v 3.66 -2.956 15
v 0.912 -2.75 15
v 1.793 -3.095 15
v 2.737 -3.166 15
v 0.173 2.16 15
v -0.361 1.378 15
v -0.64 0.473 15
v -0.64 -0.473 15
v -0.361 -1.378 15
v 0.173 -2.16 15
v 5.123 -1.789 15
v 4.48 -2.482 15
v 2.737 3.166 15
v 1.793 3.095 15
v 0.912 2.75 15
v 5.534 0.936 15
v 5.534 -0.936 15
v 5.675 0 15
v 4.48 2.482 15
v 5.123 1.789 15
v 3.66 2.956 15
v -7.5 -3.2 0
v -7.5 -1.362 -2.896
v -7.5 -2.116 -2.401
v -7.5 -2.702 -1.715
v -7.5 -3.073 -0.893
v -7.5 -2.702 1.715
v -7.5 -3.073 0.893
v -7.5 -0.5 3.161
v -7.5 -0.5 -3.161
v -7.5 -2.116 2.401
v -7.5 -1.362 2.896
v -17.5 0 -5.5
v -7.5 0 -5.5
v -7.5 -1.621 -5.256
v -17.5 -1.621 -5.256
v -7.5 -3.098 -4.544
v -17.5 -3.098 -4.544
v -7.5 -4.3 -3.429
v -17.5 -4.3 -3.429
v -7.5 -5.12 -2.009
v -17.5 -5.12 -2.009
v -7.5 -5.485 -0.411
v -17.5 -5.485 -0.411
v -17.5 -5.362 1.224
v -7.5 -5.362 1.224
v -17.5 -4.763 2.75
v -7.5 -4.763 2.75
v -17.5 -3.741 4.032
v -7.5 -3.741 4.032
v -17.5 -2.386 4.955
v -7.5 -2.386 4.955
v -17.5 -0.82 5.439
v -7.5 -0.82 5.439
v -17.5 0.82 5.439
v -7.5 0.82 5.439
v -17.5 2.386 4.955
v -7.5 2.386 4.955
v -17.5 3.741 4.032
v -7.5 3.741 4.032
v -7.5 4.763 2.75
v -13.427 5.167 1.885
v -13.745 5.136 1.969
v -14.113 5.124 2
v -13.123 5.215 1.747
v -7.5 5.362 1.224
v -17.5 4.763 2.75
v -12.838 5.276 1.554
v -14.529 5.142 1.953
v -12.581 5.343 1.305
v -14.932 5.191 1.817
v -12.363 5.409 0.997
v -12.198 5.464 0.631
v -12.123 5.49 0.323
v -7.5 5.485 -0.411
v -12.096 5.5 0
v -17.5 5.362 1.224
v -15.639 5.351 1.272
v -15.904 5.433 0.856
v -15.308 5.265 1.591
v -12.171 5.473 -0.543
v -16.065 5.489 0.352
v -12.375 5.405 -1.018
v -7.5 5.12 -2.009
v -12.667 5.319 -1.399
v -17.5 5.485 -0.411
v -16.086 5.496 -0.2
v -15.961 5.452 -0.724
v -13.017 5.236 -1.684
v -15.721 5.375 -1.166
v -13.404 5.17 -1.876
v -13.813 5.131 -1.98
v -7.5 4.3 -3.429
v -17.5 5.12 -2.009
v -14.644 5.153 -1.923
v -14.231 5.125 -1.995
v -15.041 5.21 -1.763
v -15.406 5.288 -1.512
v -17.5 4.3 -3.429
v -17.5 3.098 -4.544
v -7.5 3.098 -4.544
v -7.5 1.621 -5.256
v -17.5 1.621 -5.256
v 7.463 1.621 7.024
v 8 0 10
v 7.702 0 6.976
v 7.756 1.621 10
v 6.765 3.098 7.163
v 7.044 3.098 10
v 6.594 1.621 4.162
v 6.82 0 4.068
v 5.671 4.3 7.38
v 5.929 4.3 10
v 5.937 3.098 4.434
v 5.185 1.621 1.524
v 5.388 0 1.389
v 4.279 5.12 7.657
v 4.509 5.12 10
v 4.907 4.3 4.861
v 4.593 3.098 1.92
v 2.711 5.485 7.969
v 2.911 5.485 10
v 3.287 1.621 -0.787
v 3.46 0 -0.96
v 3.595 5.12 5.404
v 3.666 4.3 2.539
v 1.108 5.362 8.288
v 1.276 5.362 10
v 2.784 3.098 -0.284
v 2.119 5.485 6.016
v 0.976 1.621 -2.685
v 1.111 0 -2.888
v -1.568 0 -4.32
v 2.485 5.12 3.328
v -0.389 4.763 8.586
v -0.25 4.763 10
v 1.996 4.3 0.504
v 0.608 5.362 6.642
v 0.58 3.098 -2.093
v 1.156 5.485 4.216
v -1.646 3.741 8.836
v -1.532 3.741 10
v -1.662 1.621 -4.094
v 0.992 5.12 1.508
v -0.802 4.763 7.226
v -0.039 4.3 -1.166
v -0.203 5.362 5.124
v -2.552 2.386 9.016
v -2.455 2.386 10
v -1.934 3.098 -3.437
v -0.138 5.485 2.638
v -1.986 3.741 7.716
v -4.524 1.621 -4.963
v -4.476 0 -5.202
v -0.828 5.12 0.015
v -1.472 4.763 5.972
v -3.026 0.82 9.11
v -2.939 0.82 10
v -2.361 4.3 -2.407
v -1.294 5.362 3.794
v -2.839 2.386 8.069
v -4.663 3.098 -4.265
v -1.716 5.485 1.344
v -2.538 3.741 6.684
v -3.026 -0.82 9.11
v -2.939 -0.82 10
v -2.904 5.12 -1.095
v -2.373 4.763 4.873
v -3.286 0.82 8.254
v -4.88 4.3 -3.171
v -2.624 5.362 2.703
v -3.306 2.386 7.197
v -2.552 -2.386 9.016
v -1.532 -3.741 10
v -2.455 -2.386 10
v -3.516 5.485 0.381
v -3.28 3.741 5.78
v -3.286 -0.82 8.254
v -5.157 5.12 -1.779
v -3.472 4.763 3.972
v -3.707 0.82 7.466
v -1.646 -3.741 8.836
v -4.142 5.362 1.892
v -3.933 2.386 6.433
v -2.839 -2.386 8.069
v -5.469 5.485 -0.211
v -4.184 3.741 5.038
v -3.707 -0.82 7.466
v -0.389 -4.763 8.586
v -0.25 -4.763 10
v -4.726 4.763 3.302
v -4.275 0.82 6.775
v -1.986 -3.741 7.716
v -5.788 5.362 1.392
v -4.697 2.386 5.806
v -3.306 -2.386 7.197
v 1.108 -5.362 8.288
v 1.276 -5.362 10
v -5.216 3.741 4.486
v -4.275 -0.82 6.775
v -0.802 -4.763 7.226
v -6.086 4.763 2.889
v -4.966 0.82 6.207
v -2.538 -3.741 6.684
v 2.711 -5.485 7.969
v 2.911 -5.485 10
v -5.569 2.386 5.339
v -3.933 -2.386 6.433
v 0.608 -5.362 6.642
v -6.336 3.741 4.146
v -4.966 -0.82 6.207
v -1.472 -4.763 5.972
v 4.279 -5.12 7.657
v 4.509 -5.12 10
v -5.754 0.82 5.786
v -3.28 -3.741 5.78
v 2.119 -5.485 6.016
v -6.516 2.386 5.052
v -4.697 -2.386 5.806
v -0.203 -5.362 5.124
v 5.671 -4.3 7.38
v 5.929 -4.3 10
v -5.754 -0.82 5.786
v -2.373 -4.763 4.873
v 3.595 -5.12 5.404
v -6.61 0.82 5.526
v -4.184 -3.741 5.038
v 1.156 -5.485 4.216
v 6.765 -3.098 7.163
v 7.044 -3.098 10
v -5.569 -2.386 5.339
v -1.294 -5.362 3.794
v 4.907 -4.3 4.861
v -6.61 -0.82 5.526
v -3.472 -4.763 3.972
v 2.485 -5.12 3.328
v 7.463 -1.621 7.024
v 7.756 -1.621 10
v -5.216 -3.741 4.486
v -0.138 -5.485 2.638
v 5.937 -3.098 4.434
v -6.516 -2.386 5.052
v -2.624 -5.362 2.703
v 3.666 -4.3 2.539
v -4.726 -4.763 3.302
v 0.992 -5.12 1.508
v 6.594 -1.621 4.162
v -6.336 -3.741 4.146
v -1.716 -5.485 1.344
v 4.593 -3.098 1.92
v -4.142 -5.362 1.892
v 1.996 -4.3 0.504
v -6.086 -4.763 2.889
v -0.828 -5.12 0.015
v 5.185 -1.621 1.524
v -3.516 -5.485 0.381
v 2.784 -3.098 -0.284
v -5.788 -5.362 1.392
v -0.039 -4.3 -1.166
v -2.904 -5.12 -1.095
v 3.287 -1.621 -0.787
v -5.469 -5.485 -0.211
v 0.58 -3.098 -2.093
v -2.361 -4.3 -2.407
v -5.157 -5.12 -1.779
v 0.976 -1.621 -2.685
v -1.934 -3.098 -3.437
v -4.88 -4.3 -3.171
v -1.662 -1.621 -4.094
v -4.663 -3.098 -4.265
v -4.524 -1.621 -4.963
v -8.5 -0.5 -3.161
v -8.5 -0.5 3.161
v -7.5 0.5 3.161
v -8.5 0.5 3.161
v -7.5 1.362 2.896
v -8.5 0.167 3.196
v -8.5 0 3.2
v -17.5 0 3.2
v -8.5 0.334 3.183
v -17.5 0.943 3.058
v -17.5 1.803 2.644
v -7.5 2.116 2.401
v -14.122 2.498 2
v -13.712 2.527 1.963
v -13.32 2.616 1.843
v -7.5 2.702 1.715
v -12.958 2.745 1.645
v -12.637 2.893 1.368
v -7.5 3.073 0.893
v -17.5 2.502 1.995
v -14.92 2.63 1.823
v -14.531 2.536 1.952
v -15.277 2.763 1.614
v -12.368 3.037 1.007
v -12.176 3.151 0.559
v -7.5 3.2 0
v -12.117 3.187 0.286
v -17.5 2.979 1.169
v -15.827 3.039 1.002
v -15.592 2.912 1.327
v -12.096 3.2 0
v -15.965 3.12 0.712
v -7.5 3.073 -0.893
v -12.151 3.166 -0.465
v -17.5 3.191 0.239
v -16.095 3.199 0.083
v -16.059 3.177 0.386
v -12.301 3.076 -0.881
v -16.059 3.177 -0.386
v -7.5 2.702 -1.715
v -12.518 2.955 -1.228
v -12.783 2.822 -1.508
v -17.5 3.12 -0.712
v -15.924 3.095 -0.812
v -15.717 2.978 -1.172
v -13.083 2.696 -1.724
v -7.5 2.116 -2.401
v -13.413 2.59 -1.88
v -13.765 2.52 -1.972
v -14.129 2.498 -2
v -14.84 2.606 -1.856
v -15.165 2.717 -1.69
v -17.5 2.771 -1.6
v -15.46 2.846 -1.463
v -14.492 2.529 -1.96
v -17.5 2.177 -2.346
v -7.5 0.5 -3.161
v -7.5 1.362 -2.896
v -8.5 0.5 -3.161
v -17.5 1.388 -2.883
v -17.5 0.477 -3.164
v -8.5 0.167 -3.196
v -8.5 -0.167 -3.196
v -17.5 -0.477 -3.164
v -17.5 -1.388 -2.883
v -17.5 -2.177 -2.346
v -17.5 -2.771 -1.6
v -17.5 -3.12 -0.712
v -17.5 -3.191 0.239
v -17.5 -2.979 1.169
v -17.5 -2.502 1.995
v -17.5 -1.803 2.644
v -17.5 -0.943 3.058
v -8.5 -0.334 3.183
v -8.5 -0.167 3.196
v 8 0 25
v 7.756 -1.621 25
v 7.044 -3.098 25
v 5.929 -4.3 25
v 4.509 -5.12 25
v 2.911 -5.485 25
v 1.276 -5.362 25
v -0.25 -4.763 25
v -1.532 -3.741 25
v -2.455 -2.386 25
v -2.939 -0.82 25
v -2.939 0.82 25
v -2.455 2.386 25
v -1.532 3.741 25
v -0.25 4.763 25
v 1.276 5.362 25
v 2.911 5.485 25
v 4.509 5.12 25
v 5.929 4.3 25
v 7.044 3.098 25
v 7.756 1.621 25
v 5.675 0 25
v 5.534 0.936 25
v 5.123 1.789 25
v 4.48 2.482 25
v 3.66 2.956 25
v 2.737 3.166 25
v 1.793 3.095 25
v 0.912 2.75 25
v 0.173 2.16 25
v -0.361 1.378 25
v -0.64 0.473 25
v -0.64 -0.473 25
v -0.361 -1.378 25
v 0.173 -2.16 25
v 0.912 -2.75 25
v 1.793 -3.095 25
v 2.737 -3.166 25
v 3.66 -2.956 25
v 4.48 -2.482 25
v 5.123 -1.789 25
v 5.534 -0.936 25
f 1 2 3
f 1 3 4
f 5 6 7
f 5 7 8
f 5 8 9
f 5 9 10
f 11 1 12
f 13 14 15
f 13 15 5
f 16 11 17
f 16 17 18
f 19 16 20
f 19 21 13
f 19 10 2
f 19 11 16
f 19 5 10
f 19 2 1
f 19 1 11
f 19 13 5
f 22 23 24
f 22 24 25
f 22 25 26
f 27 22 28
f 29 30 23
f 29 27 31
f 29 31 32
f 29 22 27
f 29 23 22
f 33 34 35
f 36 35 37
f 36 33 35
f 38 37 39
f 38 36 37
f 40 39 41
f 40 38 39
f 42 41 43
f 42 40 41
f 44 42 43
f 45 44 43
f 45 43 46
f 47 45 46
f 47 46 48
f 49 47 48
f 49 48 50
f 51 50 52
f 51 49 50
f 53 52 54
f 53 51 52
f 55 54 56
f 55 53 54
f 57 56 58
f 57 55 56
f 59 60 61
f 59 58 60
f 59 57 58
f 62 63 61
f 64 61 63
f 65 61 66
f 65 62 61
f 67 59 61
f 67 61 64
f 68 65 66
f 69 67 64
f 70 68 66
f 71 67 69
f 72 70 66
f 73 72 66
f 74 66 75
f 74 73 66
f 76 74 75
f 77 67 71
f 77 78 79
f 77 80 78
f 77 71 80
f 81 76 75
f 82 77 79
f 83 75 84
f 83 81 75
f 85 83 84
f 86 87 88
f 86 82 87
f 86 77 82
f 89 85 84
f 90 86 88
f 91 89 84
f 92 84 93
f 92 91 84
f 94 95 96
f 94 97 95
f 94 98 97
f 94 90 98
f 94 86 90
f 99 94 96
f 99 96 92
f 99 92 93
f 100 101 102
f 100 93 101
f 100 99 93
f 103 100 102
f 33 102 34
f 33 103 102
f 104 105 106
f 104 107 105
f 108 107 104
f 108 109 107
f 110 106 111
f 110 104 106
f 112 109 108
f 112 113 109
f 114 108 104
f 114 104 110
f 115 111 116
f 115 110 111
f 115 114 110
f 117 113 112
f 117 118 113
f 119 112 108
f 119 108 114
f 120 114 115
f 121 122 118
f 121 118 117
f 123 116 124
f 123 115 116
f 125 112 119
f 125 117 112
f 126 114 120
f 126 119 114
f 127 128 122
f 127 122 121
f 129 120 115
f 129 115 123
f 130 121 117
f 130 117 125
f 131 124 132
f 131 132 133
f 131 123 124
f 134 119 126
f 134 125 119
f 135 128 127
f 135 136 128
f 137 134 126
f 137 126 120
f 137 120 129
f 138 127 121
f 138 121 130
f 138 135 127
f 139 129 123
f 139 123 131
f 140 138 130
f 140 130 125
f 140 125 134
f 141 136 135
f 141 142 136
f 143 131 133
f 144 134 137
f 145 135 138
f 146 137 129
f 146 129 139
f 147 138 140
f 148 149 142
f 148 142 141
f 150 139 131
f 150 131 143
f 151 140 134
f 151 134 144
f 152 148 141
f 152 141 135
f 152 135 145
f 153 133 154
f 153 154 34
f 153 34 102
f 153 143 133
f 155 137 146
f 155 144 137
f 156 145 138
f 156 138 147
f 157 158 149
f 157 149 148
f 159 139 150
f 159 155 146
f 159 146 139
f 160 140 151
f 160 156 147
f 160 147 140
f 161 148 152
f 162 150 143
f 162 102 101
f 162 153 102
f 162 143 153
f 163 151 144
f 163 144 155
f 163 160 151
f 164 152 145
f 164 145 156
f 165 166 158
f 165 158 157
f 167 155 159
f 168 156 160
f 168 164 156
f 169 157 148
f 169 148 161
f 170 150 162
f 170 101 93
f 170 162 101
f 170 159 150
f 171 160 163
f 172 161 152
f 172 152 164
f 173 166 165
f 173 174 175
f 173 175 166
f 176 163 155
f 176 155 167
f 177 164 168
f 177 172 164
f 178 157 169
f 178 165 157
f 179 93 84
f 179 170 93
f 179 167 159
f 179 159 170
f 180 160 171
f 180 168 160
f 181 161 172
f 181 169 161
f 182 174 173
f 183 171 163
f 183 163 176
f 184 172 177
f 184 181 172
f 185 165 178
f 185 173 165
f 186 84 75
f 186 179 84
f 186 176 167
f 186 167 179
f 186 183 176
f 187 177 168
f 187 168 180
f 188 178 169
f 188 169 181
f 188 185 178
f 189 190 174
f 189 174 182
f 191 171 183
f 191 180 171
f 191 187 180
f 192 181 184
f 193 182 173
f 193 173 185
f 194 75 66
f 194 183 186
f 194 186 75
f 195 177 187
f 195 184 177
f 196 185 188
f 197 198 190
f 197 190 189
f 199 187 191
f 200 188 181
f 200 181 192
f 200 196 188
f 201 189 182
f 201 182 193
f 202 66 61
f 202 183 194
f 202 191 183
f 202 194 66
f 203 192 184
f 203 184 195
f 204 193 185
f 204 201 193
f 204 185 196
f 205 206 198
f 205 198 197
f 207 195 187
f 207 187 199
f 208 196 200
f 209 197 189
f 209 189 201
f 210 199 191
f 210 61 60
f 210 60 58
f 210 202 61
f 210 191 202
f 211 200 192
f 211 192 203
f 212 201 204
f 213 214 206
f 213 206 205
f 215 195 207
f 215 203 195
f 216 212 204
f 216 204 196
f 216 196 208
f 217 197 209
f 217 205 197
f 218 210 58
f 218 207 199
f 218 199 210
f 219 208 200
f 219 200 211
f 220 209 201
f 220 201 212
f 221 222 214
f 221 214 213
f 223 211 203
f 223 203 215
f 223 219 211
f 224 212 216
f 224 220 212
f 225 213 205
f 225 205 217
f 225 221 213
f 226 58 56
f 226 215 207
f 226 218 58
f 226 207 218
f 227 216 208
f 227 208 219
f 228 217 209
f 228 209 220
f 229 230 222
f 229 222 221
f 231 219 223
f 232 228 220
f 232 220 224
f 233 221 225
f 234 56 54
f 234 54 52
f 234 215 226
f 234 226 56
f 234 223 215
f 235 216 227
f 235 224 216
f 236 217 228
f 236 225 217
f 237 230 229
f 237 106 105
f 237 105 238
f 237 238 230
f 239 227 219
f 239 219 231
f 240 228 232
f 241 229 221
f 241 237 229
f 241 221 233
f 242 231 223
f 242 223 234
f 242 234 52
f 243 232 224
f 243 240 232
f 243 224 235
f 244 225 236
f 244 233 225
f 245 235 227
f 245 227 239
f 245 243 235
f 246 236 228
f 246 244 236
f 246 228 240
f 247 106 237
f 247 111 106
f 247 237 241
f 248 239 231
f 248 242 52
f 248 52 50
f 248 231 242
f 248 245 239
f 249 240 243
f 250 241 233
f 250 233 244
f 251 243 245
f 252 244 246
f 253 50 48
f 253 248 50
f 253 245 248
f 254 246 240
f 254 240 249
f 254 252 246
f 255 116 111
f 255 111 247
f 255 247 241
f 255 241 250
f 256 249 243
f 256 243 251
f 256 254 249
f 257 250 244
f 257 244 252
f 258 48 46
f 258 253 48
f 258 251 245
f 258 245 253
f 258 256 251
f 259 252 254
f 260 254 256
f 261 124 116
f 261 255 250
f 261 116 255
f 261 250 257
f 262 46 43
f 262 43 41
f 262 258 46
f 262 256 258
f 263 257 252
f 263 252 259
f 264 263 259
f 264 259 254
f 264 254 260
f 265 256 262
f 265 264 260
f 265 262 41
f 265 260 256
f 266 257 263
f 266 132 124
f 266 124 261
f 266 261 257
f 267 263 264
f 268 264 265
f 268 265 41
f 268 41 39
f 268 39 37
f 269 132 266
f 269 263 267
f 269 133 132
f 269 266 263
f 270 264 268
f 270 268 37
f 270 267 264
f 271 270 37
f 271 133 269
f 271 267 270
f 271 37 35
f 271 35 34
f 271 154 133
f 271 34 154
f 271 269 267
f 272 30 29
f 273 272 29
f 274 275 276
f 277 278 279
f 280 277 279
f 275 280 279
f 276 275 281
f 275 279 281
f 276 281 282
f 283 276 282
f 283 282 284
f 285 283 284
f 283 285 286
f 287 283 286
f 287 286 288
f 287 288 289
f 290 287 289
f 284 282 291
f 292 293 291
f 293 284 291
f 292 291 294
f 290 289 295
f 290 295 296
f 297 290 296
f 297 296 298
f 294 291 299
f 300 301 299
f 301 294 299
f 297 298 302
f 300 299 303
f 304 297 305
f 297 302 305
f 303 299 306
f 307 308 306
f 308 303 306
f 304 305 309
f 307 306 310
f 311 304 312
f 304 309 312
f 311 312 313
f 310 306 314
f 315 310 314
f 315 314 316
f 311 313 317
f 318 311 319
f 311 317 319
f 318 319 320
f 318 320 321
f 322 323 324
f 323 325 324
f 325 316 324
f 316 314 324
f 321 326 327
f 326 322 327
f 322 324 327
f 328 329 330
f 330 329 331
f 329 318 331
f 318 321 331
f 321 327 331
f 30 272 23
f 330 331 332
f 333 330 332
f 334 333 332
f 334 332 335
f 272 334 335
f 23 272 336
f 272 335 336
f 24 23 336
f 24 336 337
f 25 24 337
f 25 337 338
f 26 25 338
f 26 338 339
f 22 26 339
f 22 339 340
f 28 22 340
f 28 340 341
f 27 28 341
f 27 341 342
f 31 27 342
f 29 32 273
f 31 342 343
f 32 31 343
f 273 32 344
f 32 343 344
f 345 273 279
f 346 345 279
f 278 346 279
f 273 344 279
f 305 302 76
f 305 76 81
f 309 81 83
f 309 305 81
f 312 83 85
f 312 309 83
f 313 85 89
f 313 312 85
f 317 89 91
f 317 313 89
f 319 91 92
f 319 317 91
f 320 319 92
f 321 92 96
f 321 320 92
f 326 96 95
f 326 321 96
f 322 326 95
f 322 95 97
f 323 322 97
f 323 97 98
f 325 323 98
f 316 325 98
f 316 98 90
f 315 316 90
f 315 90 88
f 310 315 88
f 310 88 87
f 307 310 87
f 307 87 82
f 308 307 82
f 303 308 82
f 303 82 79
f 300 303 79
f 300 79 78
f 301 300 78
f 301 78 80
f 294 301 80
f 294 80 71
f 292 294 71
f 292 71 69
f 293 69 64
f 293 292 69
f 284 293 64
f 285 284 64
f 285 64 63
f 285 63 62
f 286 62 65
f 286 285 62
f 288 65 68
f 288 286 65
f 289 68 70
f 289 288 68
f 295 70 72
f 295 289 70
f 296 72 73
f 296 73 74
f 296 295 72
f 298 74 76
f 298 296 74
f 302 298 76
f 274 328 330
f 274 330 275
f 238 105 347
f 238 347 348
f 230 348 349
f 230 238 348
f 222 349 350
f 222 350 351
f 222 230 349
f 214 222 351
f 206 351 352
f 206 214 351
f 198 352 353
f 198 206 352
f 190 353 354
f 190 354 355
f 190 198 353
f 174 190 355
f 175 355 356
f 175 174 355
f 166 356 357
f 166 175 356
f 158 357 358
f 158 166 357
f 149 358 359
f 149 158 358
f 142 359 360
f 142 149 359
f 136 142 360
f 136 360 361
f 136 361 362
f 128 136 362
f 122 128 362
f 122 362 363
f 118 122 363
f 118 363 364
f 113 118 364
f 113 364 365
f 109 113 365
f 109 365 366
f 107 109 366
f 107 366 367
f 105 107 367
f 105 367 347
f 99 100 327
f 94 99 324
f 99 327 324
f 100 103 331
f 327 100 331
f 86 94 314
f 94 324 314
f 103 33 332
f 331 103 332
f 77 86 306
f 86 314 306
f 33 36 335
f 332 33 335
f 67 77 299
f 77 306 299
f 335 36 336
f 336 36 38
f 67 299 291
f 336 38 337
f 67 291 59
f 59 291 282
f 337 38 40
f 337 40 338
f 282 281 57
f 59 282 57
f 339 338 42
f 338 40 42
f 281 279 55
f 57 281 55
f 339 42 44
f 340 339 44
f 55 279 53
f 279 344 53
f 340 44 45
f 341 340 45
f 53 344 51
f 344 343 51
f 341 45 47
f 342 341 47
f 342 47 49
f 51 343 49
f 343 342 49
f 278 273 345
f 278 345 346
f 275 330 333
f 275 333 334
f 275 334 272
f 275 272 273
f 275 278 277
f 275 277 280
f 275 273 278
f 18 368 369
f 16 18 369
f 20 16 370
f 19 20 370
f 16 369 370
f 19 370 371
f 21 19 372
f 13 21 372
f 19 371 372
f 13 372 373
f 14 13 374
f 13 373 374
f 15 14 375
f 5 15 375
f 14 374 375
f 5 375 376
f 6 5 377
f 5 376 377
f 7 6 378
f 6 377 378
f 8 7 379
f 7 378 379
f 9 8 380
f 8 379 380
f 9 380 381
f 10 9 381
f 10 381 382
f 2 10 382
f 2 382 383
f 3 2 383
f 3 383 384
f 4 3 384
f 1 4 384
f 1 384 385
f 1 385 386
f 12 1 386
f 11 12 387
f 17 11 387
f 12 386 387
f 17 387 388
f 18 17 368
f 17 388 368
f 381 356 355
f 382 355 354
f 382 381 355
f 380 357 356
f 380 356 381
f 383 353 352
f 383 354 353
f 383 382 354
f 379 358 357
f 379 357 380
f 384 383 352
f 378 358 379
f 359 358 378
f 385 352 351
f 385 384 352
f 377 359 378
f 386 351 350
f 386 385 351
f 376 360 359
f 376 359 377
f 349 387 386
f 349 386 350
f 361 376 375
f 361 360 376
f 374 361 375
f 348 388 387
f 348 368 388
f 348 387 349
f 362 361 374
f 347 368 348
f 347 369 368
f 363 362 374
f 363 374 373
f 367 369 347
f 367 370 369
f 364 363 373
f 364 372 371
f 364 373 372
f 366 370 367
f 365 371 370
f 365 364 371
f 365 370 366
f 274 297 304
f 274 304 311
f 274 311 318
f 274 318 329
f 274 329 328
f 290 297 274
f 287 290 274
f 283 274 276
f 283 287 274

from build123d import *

# Parameters (mm, degrees)
SKETCH4_R           = 5.5
SKETCH6_R           = 3.175
HOLE_SHAFT_DEPTH    = 10
SKETCH7_R           = 3.2
HOLE_POT_DEPTH      = 10
SKETCH8_R           = 2
CUT_EXTRUDE3_DEPTH  = 6.5000001
SKETCH11_W          = 6.737911532
SKETCH11_H          = 1
BOSS_EXTRUDE2_DEPTH = 1


with BuildPart() as part:
    # Sweep2: sweep along a path in PROFILE
    with BuildLine(Plane(origin=(0, 0, 0), x_dir=(1, 0, 0), z_dir=(0, 1, 0))) as sweep2_path:
        Line((2.5, -25), (2.5, -10))
        ThreePointArc((2.5, -10), (-0.428932188, -2.928932188), (-7.5, 0))
        Line((-7.5, 0), (-17.5, 0))
    # Sketch4 → Sweep2 (sweep)
    with BuildSketch(Plane.XY.offset(25)):
        with Locations((2.5, 0)):
            Circle(SKETCH4_R)
    sweep(path=sweep2_path.line)

    # Sketch6 → HOLE_SHAFT (cut)
    with BuildSketch(Plane.XY.offset(25)):
        with Locations((2.5, 0)):
            Circle(SKETCH6_R)
    extrude(amount=-HOLE_SHAFT_DEPTH, mode=Mode.SUBTRACT)

    # Sketch7 → HOLE_POT (cut)
    with BuildSketch(Plane.ZY.offset(17.5)):
        Circle(SKETCH7_R)
    extrude(amount=-HOLE_POT_DEPTH, mode=Mode.SUBTRACT)

    # Sketch8 → Cut-Extrude3 (cut, through all)
    with BuildSketch(Plane(origin=(0, 0, 0), x_dir=(1, 0, 0), z_dir=(0, 1, 0))):
        with Locations((-14.096251262, 0)):
            Circle(SKETCH8_R)
    extrude(amount=CUT_EXTRUDE3_DEPTH, mode=Mode.SUBTRACT)

    # Sketch11 → Boss-Extrude2 (add)
    with BuildSketch(Plane.ZY.offset(7.5)):
        Rectangle(SKETCH11_W, SKETCH11_H)
    extrude(amount=BOSS_EXTRUDE2_DEPTH)


solid = part.part
